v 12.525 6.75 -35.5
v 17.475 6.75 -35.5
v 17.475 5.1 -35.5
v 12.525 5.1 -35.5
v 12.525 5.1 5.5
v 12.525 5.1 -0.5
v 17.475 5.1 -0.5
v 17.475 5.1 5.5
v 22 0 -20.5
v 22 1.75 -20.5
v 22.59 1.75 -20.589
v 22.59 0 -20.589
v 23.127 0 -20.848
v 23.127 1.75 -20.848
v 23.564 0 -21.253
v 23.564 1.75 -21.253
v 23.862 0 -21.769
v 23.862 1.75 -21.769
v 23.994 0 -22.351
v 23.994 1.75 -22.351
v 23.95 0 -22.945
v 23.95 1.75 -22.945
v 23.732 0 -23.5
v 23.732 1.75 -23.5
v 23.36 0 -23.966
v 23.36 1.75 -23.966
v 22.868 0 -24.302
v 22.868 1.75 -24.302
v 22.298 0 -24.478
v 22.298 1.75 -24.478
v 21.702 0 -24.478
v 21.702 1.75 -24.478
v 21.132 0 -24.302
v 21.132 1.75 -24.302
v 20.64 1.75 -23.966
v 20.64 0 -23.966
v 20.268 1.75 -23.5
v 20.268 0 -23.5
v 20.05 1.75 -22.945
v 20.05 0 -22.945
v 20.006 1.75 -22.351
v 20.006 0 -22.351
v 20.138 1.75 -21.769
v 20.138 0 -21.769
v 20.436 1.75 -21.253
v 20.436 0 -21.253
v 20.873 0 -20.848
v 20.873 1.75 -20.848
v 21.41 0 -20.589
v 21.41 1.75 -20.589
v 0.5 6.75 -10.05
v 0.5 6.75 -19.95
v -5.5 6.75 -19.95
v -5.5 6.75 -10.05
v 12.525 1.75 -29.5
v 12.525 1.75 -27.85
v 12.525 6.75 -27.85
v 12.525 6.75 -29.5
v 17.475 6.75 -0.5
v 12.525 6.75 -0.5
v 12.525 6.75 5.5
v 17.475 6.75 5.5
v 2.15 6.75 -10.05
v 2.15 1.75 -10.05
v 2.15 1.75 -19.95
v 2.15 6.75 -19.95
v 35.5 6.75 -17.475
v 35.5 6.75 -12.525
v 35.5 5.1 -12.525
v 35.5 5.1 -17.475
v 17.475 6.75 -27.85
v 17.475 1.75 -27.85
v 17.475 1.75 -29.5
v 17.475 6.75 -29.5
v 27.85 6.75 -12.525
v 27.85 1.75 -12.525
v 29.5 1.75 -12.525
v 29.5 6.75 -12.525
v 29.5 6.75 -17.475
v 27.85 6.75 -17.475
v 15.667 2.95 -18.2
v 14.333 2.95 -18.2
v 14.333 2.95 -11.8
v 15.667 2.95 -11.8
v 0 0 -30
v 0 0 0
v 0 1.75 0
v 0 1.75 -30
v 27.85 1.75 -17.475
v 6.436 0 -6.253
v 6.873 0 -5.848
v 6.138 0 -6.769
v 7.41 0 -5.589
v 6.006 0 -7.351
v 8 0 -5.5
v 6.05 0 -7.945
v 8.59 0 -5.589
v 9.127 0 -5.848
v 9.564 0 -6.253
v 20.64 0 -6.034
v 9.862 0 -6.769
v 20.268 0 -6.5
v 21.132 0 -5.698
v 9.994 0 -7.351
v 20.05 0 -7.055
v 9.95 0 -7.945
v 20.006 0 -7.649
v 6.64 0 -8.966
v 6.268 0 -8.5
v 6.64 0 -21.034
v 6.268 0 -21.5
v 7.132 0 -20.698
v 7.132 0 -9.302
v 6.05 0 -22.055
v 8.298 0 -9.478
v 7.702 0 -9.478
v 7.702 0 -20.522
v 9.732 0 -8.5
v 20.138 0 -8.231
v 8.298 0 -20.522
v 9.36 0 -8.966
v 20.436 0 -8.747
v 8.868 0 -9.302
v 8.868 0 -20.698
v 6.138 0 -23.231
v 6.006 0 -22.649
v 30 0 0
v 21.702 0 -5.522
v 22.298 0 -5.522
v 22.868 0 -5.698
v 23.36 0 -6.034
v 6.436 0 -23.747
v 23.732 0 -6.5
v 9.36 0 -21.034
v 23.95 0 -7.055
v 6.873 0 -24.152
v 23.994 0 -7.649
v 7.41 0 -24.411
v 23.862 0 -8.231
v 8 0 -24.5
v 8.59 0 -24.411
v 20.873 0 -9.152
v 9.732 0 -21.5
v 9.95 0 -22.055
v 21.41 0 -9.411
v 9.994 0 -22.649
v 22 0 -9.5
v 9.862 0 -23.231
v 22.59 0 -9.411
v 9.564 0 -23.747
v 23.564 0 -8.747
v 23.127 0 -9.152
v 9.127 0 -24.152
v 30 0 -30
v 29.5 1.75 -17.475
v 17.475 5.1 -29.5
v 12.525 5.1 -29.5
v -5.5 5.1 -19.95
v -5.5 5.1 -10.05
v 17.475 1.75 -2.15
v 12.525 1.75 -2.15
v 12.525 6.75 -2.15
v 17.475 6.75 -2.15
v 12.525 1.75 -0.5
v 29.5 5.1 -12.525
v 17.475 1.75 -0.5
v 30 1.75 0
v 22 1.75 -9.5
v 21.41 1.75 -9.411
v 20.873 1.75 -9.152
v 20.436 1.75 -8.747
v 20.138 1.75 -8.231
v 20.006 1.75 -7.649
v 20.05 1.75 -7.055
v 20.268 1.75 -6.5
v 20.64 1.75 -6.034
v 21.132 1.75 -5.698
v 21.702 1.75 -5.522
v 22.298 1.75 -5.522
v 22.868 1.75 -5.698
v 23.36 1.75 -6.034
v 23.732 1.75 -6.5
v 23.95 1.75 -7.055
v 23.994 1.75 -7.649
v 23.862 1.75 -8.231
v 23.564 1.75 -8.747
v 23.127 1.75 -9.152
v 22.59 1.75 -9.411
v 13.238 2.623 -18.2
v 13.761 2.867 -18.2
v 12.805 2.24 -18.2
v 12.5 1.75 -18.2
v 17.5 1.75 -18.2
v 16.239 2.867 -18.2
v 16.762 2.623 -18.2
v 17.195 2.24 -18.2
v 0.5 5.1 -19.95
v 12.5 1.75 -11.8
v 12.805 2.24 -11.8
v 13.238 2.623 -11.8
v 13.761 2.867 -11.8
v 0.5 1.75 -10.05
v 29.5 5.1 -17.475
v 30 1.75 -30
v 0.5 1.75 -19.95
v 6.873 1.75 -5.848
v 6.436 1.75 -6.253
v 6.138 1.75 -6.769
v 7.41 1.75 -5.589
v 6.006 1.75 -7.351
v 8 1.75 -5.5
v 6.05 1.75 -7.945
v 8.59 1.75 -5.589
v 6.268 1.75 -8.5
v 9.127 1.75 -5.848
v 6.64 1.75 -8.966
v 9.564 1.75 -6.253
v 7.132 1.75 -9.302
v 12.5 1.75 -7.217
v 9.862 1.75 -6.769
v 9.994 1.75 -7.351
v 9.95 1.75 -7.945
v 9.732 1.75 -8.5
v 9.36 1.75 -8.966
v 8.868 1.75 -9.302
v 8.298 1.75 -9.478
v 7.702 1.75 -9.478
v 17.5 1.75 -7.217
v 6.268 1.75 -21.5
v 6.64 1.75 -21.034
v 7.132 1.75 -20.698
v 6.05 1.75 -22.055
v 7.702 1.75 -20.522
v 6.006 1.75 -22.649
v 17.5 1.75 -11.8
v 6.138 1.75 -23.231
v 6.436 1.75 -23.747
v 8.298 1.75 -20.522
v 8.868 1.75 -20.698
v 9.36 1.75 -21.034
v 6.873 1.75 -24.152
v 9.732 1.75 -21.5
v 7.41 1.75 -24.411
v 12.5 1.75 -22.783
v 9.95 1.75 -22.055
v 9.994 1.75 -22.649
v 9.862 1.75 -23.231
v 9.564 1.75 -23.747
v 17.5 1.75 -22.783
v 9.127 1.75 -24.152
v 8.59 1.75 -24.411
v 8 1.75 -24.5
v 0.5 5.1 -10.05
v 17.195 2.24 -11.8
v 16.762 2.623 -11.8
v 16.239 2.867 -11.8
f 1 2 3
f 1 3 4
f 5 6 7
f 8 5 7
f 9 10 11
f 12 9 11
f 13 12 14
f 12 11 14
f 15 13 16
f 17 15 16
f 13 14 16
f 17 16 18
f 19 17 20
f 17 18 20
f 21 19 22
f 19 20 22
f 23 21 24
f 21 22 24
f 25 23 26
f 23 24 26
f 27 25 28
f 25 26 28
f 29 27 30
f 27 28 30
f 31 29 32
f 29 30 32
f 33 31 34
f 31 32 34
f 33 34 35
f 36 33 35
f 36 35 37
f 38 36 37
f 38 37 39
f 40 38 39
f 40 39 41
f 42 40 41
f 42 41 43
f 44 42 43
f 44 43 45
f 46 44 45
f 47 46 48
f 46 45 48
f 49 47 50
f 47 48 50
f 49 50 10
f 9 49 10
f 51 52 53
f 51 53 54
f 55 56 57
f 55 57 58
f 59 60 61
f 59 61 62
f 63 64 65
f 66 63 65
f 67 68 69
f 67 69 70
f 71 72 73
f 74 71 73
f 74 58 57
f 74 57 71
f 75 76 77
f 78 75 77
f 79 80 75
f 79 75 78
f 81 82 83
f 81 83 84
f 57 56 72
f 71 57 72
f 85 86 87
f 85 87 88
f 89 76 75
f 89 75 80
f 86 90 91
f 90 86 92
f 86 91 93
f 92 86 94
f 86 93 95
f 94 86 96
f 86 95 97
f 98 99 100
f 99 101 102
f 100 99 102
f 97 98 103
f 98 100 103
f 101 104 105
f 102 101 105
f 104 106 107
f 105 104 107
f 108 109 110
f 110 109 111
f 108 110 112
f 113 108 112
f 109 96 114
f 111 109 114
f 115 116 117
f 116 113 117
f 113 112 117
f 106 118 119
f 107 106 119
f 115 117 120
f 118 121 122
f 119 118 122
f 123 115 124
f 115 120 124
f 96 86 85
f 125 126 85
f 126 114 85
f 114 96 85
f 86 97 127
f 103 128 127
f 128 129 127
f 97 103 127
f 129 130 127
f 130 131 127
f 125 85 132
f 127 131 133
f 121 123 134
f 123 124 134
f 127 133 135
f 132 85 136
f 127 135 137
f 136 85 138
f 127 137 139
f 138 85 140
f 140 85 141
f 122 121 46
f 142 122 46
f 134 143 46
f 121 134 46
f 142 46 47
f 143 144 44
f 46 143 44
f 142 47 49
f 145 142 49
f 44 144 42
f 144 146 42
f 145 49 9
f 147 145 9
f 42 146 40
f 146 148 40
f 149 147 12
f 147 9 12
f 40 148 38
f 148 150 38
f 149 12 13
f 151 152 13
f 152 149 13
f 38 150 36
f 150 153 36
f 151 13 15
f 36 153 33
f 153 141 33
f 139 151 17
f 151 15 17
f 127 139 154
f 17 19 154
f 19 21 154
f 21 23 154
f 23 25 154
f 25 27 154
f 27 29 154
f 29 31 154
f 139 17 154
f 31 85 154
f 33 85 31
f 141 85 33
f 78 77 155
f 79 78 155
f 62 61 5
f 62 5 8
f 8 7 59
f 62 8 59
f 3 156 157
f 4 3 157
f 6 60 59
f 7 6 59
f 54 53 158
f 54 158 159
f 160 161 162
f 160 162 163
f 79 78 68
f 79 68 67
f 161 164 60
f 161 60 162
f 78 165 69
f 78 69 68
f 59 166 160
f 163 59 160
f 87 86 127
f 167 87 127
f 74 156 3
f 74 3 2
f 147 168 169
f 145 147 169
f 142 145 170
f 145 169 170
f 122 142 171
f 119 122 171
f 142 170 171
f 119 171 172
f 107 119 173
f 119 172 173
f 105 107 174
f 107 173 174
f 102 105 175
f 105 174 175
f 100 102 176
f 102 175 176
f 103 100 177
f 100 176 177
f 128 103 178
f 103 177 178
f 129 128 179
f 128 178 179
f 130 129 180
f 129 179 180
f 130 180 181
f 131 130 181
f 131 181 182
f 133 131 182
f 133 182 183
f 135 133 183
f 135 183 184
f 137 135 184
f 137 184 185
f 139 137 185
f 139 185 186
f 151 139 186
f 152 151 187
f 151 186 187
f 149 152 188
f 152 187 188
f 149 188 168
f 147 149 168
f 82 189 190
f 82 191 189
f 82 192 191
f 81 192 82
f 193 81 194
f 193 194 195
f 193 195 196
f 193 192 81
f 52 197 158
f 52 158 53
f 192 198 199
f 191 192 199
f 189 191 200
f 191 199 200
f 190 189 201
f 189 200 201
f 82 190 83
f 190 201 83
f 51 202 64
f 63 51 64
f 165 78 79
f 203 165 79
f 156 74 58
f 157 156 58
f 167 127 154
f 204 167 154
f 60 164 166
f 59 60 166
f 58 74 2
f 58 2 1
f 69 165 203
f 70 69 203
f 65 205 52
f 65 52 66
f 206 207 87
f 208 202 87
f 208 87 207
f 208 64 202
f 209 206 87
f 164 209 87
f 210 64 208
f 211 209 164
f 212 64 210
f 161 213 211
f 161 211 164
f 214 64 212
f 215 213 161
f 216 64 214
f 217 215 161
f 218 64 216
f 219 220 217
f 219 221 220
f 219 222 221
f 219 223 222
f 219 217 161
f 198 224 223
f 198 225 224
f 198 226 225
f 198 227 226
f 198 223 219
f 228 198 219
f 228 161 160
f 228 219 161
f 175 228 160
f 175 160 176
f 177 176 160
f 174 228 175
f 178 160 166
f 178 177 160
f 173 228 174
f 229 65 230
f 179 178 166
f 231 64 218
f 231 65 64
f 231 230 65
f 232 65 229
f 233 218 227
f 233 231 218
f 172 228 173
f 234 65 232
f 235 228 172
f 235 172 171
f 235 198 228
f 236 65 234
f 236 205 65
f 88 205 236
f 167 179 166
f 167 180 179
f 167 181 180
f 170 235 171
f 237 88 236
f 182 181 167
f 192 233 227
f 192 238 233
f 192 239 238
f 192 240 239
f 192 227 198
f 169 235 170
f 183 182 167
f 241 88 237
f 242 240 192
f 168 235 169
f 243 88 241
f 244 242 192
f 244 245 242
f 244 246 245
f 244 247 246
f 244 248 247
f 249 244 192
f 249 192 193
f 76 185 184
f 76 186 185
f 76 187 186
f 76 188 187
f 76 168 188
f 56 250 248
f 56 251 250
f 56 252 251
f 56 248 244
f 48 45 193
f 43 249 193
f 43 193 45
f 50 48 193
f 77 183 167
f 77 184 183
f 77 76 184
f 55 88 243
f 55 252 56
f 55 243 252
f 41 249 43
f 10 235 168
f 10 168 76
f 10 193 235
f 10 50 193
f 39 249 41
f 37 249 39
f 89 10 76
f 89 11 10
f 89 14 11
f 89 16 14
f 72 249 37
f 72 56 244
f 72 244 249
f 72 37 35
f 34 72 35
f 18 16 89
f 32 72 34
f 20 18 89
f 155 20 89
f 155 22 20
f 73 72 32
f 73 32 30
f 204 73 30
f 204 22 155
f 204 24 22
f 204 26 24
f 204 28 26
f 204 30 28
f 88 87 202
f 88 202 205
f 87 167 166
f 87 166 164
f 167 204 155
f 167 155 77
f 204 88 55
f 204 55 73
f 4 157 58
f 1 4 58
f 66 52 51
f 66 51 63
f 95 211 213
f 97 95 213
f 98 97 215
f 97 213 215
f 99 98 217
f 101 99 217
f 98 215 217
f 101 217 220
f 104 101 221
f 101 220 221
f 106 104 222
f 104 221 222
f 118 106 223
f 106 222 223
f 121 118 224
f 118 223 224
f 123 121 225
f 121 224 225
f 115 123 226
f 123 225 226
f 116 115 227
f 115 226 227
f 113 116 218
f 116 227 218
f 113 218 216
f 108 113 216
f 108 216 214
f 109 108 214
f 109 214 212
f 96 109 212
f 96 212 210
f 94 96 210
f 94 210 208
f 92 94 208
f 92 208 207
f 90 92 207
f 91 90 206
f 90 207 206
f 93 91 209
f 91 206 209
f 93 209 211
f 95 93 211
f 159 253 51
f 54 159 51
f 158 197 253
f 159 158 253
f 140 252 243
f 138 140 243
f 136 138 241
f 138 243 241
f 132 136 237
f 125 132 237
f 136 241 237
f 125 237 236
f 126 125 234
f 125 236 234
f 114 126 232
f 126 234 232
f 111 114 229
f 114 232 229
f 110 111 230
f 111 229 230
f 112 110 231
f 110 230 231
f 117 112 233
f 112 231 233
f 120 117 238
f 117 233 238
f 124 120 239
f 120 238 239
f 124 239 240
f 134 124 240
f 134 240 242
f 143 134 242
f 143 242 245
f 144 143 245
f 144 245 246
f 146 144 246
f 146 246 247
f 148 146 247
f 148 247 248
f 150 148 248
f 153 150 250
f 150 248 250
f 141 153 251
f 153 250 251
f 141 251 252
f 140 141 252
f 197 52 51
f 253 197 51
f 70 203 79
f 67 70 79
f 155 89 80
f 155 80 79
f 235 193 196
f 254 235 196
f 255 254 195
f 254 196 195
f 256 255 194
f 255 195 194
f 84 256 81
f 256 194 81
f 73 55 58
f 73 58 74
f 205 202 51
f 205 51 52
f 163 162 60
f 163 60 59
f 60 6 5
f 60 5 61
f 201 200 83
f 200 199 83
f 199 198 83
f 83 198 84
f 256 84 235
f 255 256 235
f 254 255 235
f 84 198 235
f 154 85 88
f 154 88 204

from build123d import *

# Parameters (mm, degrees)
SKETCH1_W           = 30
SKETCH1_H           = 30
BOSS_EXTRUDE1_DEPTH = 1.75
SKETCH2_R           = 2
CUT_EXTRUDE1_DEPTH  = 1.75
SKETCH3_W           = 5
SKETCH3_H           = 6.4
BOSS_EXTRUDE2_DEPTH = 1.2
FILLET1_R           = 2
SKETCH4_W           = 1.65
SKETCH4_H           = 4.95
SKETCH4_H_2         = 9.9
SKETCH4_W_2         = 4.95
SKETCH4_H_3         = 1.65
BOSS_EXTRUDE3_DEPTH = 5
SKETCH5_W           = 4.95
SKETCH5_H           = 1.65
BASE_FLANGE1_DEPTH  = 6
SKETCH10_W          = 4.95
SKETCH10_H          = 1.65
BASE_FLANGE2_DEPTH  = 6
SKETCH13_W          = 4.95
SKETCH13_H          = 1.65
BASE_FLANGE3_DEPTH  = 6
SKETCH16_W          = 9.9
SKETCH16_H          = 1.65
BASE_FLANGE4_DEPTH  = 6


# Sheet-metal steps are written as plain solids
with BuildPart() as part:
    # Sketch1 → Boss-Extrude1 (new body)
    with BuildSketch(Plane(origin=(0, 0, 0), x_dir=(1, 0, 0), z_dir=(0, 1, 0))):
        with Locations((15, 15)):
            Rectangle(SKETCH1_W, SKETCH1_H)
    extrude(amount=BOSS_EXTRUDE1_DEPTH)

    # Sketch2 → Cut-Extrude1 (cut)
    with BuildSketch(Plane(origin=(0, 1.75, 0), x_dir=(1, 0, 0), z_dir=(0, 1, 0))):
        with Locations(Location((22, 22.5, 0), (0, 0, 270))):
            Circle(SKETCH2_R)
        with Locations(Location((22, 7.5, 0), (0, 0, 90))):
            Circle(SKETCH2_R)
        with Locations(Location((8, 22.5, 0), (0, 0, 90))):
            Circle(SKETCH2_R)
        with Locations(Location((8, 7.5, 0), (0, 0, 270))):
            Circle(SKETCH2_R)
    extrude(amount=-CUT_EXTRUDE1_DEPTH, mode=Mode.SUBTRACT)

    # Sketch3 → Boss-Extrude2 (add)
    with BuildSketch(Plane(origin=(0, 1.75, 0), x_dir=(1, 0, 0), z_dir=(0, 1, 0))):
        with Locations((15, 15)):
            Rectangle(SKETCH3_W, SKETCH3_H)
    extrude(amount=BOSS_EXTRUDE2_DEPTH)

    # Fillet1
    # the kernel refuses this fillet: 2 mm, written as the material it takes off along each edge
    with BuildSketch(Plane(origin=(17.5, 2.95, -22.782575695), x_dir=(0, -1, 0), z_dir=(0, 0, 1)), Plane(origin=(12.5, 2.95, -7.217424305), x_dir=(0, -1, 0), z_dir=(0, 0, -1))) as fillet1_piece_1:
        with BuildLine():
            CenterArc((2, -1.833030278), FILLET1_R, 113.578178478, 66.421821522)
            Line((0, -1.833030278), (-0.04, -1.833030278))
            Line((-0.04, -1.833030278), (-0.04, 0))
            Line((-0.04, 0), (0, 0.04))
            ThreePointArc((0, 0.04), (0.6, 0.04), (1.184, 0.036660606))
            Line((1.184, 0.036660606), (1.2, 0))
        make_face()
    extrude(amount=15.56515139, mode=Mode.SUBTRACT)

    # Sketch4 → Boss-Extrude3 (add)
    with BuildSketch(Plane(origin=(0, 1.75, 0), x_dir=(1, 0, 0), z_dir=(0, 1, 0))):
        with Locations((28.675, 15)):
            Rectangle(SKETCH4_W, SKETCH4_H)
        with Locations((1.325, 15)):
            Rectangle(SKETCH4_W, SKETCH4_H_2)
        with Locations((15, 1.325)):
            Rectangle(SKETCH4_W_2, SKETCH4_H_3)
        with Locations((15, 28.675)):
            Rectangle(SKETCH4_W_2, SKETCH4_H_3)
    extrude(amount=BOSS_EXTRUDE3_DEPTH)


with BuildPart() as body_2:
    # Sketch5 → Base-Flange1 (new body)
    with BuildSketch(Plane.XY.offset(-0.5)):
        with Locations((15, 5.925)):
            Rectangle(SKETCH5_W, SKETCH5_H)
    extrude(amount=BASE_FLANGE1_DEPTH)


with BuildPart() as body_3:
    # Sketch10 → Base-Flange2 (new body)
    with BuildSketch(Plane(origin=(29.5, 0, 0), x_dir=(0, 0, -1), z_dir=(1, 0, 0))):
        with Locations((15, 5.925)):
            Rectangle(SKETCH10_W, SKETCH10_H)
    extrude(amount=BASE_FLANGE2_DEPTH)


with BuildPart() as body_4:
    # Sketch13 → Base-Flange3 (new body)
    with BuildSketch(Plane(origin=(0, 0, -29.5), x_dir=(-1, 0, 0), z_dir=(0, 0, -1))):
        with Locations((-15, 5.925)):
            Rectangle(SKETCH13_W, SKETCH13_H)
    extrude(amount=BASE_FLANGE3_DEPTH)


with BuildPart() as body_5:
    # Sketch16 → Base-Flange4 (new body)
    with BuildSketch(Plane.ZY.offset(-0.5)):
        with Locations((-15, 5.925)):
            Rectangle(SKETCH16_W, SKETCH16_H)
    extrude(amount=BASE_FLANGE4_DEPTH)


solid = Compound([part.part, body_2.part, body_3.part, body_4.part, body_5.part])
